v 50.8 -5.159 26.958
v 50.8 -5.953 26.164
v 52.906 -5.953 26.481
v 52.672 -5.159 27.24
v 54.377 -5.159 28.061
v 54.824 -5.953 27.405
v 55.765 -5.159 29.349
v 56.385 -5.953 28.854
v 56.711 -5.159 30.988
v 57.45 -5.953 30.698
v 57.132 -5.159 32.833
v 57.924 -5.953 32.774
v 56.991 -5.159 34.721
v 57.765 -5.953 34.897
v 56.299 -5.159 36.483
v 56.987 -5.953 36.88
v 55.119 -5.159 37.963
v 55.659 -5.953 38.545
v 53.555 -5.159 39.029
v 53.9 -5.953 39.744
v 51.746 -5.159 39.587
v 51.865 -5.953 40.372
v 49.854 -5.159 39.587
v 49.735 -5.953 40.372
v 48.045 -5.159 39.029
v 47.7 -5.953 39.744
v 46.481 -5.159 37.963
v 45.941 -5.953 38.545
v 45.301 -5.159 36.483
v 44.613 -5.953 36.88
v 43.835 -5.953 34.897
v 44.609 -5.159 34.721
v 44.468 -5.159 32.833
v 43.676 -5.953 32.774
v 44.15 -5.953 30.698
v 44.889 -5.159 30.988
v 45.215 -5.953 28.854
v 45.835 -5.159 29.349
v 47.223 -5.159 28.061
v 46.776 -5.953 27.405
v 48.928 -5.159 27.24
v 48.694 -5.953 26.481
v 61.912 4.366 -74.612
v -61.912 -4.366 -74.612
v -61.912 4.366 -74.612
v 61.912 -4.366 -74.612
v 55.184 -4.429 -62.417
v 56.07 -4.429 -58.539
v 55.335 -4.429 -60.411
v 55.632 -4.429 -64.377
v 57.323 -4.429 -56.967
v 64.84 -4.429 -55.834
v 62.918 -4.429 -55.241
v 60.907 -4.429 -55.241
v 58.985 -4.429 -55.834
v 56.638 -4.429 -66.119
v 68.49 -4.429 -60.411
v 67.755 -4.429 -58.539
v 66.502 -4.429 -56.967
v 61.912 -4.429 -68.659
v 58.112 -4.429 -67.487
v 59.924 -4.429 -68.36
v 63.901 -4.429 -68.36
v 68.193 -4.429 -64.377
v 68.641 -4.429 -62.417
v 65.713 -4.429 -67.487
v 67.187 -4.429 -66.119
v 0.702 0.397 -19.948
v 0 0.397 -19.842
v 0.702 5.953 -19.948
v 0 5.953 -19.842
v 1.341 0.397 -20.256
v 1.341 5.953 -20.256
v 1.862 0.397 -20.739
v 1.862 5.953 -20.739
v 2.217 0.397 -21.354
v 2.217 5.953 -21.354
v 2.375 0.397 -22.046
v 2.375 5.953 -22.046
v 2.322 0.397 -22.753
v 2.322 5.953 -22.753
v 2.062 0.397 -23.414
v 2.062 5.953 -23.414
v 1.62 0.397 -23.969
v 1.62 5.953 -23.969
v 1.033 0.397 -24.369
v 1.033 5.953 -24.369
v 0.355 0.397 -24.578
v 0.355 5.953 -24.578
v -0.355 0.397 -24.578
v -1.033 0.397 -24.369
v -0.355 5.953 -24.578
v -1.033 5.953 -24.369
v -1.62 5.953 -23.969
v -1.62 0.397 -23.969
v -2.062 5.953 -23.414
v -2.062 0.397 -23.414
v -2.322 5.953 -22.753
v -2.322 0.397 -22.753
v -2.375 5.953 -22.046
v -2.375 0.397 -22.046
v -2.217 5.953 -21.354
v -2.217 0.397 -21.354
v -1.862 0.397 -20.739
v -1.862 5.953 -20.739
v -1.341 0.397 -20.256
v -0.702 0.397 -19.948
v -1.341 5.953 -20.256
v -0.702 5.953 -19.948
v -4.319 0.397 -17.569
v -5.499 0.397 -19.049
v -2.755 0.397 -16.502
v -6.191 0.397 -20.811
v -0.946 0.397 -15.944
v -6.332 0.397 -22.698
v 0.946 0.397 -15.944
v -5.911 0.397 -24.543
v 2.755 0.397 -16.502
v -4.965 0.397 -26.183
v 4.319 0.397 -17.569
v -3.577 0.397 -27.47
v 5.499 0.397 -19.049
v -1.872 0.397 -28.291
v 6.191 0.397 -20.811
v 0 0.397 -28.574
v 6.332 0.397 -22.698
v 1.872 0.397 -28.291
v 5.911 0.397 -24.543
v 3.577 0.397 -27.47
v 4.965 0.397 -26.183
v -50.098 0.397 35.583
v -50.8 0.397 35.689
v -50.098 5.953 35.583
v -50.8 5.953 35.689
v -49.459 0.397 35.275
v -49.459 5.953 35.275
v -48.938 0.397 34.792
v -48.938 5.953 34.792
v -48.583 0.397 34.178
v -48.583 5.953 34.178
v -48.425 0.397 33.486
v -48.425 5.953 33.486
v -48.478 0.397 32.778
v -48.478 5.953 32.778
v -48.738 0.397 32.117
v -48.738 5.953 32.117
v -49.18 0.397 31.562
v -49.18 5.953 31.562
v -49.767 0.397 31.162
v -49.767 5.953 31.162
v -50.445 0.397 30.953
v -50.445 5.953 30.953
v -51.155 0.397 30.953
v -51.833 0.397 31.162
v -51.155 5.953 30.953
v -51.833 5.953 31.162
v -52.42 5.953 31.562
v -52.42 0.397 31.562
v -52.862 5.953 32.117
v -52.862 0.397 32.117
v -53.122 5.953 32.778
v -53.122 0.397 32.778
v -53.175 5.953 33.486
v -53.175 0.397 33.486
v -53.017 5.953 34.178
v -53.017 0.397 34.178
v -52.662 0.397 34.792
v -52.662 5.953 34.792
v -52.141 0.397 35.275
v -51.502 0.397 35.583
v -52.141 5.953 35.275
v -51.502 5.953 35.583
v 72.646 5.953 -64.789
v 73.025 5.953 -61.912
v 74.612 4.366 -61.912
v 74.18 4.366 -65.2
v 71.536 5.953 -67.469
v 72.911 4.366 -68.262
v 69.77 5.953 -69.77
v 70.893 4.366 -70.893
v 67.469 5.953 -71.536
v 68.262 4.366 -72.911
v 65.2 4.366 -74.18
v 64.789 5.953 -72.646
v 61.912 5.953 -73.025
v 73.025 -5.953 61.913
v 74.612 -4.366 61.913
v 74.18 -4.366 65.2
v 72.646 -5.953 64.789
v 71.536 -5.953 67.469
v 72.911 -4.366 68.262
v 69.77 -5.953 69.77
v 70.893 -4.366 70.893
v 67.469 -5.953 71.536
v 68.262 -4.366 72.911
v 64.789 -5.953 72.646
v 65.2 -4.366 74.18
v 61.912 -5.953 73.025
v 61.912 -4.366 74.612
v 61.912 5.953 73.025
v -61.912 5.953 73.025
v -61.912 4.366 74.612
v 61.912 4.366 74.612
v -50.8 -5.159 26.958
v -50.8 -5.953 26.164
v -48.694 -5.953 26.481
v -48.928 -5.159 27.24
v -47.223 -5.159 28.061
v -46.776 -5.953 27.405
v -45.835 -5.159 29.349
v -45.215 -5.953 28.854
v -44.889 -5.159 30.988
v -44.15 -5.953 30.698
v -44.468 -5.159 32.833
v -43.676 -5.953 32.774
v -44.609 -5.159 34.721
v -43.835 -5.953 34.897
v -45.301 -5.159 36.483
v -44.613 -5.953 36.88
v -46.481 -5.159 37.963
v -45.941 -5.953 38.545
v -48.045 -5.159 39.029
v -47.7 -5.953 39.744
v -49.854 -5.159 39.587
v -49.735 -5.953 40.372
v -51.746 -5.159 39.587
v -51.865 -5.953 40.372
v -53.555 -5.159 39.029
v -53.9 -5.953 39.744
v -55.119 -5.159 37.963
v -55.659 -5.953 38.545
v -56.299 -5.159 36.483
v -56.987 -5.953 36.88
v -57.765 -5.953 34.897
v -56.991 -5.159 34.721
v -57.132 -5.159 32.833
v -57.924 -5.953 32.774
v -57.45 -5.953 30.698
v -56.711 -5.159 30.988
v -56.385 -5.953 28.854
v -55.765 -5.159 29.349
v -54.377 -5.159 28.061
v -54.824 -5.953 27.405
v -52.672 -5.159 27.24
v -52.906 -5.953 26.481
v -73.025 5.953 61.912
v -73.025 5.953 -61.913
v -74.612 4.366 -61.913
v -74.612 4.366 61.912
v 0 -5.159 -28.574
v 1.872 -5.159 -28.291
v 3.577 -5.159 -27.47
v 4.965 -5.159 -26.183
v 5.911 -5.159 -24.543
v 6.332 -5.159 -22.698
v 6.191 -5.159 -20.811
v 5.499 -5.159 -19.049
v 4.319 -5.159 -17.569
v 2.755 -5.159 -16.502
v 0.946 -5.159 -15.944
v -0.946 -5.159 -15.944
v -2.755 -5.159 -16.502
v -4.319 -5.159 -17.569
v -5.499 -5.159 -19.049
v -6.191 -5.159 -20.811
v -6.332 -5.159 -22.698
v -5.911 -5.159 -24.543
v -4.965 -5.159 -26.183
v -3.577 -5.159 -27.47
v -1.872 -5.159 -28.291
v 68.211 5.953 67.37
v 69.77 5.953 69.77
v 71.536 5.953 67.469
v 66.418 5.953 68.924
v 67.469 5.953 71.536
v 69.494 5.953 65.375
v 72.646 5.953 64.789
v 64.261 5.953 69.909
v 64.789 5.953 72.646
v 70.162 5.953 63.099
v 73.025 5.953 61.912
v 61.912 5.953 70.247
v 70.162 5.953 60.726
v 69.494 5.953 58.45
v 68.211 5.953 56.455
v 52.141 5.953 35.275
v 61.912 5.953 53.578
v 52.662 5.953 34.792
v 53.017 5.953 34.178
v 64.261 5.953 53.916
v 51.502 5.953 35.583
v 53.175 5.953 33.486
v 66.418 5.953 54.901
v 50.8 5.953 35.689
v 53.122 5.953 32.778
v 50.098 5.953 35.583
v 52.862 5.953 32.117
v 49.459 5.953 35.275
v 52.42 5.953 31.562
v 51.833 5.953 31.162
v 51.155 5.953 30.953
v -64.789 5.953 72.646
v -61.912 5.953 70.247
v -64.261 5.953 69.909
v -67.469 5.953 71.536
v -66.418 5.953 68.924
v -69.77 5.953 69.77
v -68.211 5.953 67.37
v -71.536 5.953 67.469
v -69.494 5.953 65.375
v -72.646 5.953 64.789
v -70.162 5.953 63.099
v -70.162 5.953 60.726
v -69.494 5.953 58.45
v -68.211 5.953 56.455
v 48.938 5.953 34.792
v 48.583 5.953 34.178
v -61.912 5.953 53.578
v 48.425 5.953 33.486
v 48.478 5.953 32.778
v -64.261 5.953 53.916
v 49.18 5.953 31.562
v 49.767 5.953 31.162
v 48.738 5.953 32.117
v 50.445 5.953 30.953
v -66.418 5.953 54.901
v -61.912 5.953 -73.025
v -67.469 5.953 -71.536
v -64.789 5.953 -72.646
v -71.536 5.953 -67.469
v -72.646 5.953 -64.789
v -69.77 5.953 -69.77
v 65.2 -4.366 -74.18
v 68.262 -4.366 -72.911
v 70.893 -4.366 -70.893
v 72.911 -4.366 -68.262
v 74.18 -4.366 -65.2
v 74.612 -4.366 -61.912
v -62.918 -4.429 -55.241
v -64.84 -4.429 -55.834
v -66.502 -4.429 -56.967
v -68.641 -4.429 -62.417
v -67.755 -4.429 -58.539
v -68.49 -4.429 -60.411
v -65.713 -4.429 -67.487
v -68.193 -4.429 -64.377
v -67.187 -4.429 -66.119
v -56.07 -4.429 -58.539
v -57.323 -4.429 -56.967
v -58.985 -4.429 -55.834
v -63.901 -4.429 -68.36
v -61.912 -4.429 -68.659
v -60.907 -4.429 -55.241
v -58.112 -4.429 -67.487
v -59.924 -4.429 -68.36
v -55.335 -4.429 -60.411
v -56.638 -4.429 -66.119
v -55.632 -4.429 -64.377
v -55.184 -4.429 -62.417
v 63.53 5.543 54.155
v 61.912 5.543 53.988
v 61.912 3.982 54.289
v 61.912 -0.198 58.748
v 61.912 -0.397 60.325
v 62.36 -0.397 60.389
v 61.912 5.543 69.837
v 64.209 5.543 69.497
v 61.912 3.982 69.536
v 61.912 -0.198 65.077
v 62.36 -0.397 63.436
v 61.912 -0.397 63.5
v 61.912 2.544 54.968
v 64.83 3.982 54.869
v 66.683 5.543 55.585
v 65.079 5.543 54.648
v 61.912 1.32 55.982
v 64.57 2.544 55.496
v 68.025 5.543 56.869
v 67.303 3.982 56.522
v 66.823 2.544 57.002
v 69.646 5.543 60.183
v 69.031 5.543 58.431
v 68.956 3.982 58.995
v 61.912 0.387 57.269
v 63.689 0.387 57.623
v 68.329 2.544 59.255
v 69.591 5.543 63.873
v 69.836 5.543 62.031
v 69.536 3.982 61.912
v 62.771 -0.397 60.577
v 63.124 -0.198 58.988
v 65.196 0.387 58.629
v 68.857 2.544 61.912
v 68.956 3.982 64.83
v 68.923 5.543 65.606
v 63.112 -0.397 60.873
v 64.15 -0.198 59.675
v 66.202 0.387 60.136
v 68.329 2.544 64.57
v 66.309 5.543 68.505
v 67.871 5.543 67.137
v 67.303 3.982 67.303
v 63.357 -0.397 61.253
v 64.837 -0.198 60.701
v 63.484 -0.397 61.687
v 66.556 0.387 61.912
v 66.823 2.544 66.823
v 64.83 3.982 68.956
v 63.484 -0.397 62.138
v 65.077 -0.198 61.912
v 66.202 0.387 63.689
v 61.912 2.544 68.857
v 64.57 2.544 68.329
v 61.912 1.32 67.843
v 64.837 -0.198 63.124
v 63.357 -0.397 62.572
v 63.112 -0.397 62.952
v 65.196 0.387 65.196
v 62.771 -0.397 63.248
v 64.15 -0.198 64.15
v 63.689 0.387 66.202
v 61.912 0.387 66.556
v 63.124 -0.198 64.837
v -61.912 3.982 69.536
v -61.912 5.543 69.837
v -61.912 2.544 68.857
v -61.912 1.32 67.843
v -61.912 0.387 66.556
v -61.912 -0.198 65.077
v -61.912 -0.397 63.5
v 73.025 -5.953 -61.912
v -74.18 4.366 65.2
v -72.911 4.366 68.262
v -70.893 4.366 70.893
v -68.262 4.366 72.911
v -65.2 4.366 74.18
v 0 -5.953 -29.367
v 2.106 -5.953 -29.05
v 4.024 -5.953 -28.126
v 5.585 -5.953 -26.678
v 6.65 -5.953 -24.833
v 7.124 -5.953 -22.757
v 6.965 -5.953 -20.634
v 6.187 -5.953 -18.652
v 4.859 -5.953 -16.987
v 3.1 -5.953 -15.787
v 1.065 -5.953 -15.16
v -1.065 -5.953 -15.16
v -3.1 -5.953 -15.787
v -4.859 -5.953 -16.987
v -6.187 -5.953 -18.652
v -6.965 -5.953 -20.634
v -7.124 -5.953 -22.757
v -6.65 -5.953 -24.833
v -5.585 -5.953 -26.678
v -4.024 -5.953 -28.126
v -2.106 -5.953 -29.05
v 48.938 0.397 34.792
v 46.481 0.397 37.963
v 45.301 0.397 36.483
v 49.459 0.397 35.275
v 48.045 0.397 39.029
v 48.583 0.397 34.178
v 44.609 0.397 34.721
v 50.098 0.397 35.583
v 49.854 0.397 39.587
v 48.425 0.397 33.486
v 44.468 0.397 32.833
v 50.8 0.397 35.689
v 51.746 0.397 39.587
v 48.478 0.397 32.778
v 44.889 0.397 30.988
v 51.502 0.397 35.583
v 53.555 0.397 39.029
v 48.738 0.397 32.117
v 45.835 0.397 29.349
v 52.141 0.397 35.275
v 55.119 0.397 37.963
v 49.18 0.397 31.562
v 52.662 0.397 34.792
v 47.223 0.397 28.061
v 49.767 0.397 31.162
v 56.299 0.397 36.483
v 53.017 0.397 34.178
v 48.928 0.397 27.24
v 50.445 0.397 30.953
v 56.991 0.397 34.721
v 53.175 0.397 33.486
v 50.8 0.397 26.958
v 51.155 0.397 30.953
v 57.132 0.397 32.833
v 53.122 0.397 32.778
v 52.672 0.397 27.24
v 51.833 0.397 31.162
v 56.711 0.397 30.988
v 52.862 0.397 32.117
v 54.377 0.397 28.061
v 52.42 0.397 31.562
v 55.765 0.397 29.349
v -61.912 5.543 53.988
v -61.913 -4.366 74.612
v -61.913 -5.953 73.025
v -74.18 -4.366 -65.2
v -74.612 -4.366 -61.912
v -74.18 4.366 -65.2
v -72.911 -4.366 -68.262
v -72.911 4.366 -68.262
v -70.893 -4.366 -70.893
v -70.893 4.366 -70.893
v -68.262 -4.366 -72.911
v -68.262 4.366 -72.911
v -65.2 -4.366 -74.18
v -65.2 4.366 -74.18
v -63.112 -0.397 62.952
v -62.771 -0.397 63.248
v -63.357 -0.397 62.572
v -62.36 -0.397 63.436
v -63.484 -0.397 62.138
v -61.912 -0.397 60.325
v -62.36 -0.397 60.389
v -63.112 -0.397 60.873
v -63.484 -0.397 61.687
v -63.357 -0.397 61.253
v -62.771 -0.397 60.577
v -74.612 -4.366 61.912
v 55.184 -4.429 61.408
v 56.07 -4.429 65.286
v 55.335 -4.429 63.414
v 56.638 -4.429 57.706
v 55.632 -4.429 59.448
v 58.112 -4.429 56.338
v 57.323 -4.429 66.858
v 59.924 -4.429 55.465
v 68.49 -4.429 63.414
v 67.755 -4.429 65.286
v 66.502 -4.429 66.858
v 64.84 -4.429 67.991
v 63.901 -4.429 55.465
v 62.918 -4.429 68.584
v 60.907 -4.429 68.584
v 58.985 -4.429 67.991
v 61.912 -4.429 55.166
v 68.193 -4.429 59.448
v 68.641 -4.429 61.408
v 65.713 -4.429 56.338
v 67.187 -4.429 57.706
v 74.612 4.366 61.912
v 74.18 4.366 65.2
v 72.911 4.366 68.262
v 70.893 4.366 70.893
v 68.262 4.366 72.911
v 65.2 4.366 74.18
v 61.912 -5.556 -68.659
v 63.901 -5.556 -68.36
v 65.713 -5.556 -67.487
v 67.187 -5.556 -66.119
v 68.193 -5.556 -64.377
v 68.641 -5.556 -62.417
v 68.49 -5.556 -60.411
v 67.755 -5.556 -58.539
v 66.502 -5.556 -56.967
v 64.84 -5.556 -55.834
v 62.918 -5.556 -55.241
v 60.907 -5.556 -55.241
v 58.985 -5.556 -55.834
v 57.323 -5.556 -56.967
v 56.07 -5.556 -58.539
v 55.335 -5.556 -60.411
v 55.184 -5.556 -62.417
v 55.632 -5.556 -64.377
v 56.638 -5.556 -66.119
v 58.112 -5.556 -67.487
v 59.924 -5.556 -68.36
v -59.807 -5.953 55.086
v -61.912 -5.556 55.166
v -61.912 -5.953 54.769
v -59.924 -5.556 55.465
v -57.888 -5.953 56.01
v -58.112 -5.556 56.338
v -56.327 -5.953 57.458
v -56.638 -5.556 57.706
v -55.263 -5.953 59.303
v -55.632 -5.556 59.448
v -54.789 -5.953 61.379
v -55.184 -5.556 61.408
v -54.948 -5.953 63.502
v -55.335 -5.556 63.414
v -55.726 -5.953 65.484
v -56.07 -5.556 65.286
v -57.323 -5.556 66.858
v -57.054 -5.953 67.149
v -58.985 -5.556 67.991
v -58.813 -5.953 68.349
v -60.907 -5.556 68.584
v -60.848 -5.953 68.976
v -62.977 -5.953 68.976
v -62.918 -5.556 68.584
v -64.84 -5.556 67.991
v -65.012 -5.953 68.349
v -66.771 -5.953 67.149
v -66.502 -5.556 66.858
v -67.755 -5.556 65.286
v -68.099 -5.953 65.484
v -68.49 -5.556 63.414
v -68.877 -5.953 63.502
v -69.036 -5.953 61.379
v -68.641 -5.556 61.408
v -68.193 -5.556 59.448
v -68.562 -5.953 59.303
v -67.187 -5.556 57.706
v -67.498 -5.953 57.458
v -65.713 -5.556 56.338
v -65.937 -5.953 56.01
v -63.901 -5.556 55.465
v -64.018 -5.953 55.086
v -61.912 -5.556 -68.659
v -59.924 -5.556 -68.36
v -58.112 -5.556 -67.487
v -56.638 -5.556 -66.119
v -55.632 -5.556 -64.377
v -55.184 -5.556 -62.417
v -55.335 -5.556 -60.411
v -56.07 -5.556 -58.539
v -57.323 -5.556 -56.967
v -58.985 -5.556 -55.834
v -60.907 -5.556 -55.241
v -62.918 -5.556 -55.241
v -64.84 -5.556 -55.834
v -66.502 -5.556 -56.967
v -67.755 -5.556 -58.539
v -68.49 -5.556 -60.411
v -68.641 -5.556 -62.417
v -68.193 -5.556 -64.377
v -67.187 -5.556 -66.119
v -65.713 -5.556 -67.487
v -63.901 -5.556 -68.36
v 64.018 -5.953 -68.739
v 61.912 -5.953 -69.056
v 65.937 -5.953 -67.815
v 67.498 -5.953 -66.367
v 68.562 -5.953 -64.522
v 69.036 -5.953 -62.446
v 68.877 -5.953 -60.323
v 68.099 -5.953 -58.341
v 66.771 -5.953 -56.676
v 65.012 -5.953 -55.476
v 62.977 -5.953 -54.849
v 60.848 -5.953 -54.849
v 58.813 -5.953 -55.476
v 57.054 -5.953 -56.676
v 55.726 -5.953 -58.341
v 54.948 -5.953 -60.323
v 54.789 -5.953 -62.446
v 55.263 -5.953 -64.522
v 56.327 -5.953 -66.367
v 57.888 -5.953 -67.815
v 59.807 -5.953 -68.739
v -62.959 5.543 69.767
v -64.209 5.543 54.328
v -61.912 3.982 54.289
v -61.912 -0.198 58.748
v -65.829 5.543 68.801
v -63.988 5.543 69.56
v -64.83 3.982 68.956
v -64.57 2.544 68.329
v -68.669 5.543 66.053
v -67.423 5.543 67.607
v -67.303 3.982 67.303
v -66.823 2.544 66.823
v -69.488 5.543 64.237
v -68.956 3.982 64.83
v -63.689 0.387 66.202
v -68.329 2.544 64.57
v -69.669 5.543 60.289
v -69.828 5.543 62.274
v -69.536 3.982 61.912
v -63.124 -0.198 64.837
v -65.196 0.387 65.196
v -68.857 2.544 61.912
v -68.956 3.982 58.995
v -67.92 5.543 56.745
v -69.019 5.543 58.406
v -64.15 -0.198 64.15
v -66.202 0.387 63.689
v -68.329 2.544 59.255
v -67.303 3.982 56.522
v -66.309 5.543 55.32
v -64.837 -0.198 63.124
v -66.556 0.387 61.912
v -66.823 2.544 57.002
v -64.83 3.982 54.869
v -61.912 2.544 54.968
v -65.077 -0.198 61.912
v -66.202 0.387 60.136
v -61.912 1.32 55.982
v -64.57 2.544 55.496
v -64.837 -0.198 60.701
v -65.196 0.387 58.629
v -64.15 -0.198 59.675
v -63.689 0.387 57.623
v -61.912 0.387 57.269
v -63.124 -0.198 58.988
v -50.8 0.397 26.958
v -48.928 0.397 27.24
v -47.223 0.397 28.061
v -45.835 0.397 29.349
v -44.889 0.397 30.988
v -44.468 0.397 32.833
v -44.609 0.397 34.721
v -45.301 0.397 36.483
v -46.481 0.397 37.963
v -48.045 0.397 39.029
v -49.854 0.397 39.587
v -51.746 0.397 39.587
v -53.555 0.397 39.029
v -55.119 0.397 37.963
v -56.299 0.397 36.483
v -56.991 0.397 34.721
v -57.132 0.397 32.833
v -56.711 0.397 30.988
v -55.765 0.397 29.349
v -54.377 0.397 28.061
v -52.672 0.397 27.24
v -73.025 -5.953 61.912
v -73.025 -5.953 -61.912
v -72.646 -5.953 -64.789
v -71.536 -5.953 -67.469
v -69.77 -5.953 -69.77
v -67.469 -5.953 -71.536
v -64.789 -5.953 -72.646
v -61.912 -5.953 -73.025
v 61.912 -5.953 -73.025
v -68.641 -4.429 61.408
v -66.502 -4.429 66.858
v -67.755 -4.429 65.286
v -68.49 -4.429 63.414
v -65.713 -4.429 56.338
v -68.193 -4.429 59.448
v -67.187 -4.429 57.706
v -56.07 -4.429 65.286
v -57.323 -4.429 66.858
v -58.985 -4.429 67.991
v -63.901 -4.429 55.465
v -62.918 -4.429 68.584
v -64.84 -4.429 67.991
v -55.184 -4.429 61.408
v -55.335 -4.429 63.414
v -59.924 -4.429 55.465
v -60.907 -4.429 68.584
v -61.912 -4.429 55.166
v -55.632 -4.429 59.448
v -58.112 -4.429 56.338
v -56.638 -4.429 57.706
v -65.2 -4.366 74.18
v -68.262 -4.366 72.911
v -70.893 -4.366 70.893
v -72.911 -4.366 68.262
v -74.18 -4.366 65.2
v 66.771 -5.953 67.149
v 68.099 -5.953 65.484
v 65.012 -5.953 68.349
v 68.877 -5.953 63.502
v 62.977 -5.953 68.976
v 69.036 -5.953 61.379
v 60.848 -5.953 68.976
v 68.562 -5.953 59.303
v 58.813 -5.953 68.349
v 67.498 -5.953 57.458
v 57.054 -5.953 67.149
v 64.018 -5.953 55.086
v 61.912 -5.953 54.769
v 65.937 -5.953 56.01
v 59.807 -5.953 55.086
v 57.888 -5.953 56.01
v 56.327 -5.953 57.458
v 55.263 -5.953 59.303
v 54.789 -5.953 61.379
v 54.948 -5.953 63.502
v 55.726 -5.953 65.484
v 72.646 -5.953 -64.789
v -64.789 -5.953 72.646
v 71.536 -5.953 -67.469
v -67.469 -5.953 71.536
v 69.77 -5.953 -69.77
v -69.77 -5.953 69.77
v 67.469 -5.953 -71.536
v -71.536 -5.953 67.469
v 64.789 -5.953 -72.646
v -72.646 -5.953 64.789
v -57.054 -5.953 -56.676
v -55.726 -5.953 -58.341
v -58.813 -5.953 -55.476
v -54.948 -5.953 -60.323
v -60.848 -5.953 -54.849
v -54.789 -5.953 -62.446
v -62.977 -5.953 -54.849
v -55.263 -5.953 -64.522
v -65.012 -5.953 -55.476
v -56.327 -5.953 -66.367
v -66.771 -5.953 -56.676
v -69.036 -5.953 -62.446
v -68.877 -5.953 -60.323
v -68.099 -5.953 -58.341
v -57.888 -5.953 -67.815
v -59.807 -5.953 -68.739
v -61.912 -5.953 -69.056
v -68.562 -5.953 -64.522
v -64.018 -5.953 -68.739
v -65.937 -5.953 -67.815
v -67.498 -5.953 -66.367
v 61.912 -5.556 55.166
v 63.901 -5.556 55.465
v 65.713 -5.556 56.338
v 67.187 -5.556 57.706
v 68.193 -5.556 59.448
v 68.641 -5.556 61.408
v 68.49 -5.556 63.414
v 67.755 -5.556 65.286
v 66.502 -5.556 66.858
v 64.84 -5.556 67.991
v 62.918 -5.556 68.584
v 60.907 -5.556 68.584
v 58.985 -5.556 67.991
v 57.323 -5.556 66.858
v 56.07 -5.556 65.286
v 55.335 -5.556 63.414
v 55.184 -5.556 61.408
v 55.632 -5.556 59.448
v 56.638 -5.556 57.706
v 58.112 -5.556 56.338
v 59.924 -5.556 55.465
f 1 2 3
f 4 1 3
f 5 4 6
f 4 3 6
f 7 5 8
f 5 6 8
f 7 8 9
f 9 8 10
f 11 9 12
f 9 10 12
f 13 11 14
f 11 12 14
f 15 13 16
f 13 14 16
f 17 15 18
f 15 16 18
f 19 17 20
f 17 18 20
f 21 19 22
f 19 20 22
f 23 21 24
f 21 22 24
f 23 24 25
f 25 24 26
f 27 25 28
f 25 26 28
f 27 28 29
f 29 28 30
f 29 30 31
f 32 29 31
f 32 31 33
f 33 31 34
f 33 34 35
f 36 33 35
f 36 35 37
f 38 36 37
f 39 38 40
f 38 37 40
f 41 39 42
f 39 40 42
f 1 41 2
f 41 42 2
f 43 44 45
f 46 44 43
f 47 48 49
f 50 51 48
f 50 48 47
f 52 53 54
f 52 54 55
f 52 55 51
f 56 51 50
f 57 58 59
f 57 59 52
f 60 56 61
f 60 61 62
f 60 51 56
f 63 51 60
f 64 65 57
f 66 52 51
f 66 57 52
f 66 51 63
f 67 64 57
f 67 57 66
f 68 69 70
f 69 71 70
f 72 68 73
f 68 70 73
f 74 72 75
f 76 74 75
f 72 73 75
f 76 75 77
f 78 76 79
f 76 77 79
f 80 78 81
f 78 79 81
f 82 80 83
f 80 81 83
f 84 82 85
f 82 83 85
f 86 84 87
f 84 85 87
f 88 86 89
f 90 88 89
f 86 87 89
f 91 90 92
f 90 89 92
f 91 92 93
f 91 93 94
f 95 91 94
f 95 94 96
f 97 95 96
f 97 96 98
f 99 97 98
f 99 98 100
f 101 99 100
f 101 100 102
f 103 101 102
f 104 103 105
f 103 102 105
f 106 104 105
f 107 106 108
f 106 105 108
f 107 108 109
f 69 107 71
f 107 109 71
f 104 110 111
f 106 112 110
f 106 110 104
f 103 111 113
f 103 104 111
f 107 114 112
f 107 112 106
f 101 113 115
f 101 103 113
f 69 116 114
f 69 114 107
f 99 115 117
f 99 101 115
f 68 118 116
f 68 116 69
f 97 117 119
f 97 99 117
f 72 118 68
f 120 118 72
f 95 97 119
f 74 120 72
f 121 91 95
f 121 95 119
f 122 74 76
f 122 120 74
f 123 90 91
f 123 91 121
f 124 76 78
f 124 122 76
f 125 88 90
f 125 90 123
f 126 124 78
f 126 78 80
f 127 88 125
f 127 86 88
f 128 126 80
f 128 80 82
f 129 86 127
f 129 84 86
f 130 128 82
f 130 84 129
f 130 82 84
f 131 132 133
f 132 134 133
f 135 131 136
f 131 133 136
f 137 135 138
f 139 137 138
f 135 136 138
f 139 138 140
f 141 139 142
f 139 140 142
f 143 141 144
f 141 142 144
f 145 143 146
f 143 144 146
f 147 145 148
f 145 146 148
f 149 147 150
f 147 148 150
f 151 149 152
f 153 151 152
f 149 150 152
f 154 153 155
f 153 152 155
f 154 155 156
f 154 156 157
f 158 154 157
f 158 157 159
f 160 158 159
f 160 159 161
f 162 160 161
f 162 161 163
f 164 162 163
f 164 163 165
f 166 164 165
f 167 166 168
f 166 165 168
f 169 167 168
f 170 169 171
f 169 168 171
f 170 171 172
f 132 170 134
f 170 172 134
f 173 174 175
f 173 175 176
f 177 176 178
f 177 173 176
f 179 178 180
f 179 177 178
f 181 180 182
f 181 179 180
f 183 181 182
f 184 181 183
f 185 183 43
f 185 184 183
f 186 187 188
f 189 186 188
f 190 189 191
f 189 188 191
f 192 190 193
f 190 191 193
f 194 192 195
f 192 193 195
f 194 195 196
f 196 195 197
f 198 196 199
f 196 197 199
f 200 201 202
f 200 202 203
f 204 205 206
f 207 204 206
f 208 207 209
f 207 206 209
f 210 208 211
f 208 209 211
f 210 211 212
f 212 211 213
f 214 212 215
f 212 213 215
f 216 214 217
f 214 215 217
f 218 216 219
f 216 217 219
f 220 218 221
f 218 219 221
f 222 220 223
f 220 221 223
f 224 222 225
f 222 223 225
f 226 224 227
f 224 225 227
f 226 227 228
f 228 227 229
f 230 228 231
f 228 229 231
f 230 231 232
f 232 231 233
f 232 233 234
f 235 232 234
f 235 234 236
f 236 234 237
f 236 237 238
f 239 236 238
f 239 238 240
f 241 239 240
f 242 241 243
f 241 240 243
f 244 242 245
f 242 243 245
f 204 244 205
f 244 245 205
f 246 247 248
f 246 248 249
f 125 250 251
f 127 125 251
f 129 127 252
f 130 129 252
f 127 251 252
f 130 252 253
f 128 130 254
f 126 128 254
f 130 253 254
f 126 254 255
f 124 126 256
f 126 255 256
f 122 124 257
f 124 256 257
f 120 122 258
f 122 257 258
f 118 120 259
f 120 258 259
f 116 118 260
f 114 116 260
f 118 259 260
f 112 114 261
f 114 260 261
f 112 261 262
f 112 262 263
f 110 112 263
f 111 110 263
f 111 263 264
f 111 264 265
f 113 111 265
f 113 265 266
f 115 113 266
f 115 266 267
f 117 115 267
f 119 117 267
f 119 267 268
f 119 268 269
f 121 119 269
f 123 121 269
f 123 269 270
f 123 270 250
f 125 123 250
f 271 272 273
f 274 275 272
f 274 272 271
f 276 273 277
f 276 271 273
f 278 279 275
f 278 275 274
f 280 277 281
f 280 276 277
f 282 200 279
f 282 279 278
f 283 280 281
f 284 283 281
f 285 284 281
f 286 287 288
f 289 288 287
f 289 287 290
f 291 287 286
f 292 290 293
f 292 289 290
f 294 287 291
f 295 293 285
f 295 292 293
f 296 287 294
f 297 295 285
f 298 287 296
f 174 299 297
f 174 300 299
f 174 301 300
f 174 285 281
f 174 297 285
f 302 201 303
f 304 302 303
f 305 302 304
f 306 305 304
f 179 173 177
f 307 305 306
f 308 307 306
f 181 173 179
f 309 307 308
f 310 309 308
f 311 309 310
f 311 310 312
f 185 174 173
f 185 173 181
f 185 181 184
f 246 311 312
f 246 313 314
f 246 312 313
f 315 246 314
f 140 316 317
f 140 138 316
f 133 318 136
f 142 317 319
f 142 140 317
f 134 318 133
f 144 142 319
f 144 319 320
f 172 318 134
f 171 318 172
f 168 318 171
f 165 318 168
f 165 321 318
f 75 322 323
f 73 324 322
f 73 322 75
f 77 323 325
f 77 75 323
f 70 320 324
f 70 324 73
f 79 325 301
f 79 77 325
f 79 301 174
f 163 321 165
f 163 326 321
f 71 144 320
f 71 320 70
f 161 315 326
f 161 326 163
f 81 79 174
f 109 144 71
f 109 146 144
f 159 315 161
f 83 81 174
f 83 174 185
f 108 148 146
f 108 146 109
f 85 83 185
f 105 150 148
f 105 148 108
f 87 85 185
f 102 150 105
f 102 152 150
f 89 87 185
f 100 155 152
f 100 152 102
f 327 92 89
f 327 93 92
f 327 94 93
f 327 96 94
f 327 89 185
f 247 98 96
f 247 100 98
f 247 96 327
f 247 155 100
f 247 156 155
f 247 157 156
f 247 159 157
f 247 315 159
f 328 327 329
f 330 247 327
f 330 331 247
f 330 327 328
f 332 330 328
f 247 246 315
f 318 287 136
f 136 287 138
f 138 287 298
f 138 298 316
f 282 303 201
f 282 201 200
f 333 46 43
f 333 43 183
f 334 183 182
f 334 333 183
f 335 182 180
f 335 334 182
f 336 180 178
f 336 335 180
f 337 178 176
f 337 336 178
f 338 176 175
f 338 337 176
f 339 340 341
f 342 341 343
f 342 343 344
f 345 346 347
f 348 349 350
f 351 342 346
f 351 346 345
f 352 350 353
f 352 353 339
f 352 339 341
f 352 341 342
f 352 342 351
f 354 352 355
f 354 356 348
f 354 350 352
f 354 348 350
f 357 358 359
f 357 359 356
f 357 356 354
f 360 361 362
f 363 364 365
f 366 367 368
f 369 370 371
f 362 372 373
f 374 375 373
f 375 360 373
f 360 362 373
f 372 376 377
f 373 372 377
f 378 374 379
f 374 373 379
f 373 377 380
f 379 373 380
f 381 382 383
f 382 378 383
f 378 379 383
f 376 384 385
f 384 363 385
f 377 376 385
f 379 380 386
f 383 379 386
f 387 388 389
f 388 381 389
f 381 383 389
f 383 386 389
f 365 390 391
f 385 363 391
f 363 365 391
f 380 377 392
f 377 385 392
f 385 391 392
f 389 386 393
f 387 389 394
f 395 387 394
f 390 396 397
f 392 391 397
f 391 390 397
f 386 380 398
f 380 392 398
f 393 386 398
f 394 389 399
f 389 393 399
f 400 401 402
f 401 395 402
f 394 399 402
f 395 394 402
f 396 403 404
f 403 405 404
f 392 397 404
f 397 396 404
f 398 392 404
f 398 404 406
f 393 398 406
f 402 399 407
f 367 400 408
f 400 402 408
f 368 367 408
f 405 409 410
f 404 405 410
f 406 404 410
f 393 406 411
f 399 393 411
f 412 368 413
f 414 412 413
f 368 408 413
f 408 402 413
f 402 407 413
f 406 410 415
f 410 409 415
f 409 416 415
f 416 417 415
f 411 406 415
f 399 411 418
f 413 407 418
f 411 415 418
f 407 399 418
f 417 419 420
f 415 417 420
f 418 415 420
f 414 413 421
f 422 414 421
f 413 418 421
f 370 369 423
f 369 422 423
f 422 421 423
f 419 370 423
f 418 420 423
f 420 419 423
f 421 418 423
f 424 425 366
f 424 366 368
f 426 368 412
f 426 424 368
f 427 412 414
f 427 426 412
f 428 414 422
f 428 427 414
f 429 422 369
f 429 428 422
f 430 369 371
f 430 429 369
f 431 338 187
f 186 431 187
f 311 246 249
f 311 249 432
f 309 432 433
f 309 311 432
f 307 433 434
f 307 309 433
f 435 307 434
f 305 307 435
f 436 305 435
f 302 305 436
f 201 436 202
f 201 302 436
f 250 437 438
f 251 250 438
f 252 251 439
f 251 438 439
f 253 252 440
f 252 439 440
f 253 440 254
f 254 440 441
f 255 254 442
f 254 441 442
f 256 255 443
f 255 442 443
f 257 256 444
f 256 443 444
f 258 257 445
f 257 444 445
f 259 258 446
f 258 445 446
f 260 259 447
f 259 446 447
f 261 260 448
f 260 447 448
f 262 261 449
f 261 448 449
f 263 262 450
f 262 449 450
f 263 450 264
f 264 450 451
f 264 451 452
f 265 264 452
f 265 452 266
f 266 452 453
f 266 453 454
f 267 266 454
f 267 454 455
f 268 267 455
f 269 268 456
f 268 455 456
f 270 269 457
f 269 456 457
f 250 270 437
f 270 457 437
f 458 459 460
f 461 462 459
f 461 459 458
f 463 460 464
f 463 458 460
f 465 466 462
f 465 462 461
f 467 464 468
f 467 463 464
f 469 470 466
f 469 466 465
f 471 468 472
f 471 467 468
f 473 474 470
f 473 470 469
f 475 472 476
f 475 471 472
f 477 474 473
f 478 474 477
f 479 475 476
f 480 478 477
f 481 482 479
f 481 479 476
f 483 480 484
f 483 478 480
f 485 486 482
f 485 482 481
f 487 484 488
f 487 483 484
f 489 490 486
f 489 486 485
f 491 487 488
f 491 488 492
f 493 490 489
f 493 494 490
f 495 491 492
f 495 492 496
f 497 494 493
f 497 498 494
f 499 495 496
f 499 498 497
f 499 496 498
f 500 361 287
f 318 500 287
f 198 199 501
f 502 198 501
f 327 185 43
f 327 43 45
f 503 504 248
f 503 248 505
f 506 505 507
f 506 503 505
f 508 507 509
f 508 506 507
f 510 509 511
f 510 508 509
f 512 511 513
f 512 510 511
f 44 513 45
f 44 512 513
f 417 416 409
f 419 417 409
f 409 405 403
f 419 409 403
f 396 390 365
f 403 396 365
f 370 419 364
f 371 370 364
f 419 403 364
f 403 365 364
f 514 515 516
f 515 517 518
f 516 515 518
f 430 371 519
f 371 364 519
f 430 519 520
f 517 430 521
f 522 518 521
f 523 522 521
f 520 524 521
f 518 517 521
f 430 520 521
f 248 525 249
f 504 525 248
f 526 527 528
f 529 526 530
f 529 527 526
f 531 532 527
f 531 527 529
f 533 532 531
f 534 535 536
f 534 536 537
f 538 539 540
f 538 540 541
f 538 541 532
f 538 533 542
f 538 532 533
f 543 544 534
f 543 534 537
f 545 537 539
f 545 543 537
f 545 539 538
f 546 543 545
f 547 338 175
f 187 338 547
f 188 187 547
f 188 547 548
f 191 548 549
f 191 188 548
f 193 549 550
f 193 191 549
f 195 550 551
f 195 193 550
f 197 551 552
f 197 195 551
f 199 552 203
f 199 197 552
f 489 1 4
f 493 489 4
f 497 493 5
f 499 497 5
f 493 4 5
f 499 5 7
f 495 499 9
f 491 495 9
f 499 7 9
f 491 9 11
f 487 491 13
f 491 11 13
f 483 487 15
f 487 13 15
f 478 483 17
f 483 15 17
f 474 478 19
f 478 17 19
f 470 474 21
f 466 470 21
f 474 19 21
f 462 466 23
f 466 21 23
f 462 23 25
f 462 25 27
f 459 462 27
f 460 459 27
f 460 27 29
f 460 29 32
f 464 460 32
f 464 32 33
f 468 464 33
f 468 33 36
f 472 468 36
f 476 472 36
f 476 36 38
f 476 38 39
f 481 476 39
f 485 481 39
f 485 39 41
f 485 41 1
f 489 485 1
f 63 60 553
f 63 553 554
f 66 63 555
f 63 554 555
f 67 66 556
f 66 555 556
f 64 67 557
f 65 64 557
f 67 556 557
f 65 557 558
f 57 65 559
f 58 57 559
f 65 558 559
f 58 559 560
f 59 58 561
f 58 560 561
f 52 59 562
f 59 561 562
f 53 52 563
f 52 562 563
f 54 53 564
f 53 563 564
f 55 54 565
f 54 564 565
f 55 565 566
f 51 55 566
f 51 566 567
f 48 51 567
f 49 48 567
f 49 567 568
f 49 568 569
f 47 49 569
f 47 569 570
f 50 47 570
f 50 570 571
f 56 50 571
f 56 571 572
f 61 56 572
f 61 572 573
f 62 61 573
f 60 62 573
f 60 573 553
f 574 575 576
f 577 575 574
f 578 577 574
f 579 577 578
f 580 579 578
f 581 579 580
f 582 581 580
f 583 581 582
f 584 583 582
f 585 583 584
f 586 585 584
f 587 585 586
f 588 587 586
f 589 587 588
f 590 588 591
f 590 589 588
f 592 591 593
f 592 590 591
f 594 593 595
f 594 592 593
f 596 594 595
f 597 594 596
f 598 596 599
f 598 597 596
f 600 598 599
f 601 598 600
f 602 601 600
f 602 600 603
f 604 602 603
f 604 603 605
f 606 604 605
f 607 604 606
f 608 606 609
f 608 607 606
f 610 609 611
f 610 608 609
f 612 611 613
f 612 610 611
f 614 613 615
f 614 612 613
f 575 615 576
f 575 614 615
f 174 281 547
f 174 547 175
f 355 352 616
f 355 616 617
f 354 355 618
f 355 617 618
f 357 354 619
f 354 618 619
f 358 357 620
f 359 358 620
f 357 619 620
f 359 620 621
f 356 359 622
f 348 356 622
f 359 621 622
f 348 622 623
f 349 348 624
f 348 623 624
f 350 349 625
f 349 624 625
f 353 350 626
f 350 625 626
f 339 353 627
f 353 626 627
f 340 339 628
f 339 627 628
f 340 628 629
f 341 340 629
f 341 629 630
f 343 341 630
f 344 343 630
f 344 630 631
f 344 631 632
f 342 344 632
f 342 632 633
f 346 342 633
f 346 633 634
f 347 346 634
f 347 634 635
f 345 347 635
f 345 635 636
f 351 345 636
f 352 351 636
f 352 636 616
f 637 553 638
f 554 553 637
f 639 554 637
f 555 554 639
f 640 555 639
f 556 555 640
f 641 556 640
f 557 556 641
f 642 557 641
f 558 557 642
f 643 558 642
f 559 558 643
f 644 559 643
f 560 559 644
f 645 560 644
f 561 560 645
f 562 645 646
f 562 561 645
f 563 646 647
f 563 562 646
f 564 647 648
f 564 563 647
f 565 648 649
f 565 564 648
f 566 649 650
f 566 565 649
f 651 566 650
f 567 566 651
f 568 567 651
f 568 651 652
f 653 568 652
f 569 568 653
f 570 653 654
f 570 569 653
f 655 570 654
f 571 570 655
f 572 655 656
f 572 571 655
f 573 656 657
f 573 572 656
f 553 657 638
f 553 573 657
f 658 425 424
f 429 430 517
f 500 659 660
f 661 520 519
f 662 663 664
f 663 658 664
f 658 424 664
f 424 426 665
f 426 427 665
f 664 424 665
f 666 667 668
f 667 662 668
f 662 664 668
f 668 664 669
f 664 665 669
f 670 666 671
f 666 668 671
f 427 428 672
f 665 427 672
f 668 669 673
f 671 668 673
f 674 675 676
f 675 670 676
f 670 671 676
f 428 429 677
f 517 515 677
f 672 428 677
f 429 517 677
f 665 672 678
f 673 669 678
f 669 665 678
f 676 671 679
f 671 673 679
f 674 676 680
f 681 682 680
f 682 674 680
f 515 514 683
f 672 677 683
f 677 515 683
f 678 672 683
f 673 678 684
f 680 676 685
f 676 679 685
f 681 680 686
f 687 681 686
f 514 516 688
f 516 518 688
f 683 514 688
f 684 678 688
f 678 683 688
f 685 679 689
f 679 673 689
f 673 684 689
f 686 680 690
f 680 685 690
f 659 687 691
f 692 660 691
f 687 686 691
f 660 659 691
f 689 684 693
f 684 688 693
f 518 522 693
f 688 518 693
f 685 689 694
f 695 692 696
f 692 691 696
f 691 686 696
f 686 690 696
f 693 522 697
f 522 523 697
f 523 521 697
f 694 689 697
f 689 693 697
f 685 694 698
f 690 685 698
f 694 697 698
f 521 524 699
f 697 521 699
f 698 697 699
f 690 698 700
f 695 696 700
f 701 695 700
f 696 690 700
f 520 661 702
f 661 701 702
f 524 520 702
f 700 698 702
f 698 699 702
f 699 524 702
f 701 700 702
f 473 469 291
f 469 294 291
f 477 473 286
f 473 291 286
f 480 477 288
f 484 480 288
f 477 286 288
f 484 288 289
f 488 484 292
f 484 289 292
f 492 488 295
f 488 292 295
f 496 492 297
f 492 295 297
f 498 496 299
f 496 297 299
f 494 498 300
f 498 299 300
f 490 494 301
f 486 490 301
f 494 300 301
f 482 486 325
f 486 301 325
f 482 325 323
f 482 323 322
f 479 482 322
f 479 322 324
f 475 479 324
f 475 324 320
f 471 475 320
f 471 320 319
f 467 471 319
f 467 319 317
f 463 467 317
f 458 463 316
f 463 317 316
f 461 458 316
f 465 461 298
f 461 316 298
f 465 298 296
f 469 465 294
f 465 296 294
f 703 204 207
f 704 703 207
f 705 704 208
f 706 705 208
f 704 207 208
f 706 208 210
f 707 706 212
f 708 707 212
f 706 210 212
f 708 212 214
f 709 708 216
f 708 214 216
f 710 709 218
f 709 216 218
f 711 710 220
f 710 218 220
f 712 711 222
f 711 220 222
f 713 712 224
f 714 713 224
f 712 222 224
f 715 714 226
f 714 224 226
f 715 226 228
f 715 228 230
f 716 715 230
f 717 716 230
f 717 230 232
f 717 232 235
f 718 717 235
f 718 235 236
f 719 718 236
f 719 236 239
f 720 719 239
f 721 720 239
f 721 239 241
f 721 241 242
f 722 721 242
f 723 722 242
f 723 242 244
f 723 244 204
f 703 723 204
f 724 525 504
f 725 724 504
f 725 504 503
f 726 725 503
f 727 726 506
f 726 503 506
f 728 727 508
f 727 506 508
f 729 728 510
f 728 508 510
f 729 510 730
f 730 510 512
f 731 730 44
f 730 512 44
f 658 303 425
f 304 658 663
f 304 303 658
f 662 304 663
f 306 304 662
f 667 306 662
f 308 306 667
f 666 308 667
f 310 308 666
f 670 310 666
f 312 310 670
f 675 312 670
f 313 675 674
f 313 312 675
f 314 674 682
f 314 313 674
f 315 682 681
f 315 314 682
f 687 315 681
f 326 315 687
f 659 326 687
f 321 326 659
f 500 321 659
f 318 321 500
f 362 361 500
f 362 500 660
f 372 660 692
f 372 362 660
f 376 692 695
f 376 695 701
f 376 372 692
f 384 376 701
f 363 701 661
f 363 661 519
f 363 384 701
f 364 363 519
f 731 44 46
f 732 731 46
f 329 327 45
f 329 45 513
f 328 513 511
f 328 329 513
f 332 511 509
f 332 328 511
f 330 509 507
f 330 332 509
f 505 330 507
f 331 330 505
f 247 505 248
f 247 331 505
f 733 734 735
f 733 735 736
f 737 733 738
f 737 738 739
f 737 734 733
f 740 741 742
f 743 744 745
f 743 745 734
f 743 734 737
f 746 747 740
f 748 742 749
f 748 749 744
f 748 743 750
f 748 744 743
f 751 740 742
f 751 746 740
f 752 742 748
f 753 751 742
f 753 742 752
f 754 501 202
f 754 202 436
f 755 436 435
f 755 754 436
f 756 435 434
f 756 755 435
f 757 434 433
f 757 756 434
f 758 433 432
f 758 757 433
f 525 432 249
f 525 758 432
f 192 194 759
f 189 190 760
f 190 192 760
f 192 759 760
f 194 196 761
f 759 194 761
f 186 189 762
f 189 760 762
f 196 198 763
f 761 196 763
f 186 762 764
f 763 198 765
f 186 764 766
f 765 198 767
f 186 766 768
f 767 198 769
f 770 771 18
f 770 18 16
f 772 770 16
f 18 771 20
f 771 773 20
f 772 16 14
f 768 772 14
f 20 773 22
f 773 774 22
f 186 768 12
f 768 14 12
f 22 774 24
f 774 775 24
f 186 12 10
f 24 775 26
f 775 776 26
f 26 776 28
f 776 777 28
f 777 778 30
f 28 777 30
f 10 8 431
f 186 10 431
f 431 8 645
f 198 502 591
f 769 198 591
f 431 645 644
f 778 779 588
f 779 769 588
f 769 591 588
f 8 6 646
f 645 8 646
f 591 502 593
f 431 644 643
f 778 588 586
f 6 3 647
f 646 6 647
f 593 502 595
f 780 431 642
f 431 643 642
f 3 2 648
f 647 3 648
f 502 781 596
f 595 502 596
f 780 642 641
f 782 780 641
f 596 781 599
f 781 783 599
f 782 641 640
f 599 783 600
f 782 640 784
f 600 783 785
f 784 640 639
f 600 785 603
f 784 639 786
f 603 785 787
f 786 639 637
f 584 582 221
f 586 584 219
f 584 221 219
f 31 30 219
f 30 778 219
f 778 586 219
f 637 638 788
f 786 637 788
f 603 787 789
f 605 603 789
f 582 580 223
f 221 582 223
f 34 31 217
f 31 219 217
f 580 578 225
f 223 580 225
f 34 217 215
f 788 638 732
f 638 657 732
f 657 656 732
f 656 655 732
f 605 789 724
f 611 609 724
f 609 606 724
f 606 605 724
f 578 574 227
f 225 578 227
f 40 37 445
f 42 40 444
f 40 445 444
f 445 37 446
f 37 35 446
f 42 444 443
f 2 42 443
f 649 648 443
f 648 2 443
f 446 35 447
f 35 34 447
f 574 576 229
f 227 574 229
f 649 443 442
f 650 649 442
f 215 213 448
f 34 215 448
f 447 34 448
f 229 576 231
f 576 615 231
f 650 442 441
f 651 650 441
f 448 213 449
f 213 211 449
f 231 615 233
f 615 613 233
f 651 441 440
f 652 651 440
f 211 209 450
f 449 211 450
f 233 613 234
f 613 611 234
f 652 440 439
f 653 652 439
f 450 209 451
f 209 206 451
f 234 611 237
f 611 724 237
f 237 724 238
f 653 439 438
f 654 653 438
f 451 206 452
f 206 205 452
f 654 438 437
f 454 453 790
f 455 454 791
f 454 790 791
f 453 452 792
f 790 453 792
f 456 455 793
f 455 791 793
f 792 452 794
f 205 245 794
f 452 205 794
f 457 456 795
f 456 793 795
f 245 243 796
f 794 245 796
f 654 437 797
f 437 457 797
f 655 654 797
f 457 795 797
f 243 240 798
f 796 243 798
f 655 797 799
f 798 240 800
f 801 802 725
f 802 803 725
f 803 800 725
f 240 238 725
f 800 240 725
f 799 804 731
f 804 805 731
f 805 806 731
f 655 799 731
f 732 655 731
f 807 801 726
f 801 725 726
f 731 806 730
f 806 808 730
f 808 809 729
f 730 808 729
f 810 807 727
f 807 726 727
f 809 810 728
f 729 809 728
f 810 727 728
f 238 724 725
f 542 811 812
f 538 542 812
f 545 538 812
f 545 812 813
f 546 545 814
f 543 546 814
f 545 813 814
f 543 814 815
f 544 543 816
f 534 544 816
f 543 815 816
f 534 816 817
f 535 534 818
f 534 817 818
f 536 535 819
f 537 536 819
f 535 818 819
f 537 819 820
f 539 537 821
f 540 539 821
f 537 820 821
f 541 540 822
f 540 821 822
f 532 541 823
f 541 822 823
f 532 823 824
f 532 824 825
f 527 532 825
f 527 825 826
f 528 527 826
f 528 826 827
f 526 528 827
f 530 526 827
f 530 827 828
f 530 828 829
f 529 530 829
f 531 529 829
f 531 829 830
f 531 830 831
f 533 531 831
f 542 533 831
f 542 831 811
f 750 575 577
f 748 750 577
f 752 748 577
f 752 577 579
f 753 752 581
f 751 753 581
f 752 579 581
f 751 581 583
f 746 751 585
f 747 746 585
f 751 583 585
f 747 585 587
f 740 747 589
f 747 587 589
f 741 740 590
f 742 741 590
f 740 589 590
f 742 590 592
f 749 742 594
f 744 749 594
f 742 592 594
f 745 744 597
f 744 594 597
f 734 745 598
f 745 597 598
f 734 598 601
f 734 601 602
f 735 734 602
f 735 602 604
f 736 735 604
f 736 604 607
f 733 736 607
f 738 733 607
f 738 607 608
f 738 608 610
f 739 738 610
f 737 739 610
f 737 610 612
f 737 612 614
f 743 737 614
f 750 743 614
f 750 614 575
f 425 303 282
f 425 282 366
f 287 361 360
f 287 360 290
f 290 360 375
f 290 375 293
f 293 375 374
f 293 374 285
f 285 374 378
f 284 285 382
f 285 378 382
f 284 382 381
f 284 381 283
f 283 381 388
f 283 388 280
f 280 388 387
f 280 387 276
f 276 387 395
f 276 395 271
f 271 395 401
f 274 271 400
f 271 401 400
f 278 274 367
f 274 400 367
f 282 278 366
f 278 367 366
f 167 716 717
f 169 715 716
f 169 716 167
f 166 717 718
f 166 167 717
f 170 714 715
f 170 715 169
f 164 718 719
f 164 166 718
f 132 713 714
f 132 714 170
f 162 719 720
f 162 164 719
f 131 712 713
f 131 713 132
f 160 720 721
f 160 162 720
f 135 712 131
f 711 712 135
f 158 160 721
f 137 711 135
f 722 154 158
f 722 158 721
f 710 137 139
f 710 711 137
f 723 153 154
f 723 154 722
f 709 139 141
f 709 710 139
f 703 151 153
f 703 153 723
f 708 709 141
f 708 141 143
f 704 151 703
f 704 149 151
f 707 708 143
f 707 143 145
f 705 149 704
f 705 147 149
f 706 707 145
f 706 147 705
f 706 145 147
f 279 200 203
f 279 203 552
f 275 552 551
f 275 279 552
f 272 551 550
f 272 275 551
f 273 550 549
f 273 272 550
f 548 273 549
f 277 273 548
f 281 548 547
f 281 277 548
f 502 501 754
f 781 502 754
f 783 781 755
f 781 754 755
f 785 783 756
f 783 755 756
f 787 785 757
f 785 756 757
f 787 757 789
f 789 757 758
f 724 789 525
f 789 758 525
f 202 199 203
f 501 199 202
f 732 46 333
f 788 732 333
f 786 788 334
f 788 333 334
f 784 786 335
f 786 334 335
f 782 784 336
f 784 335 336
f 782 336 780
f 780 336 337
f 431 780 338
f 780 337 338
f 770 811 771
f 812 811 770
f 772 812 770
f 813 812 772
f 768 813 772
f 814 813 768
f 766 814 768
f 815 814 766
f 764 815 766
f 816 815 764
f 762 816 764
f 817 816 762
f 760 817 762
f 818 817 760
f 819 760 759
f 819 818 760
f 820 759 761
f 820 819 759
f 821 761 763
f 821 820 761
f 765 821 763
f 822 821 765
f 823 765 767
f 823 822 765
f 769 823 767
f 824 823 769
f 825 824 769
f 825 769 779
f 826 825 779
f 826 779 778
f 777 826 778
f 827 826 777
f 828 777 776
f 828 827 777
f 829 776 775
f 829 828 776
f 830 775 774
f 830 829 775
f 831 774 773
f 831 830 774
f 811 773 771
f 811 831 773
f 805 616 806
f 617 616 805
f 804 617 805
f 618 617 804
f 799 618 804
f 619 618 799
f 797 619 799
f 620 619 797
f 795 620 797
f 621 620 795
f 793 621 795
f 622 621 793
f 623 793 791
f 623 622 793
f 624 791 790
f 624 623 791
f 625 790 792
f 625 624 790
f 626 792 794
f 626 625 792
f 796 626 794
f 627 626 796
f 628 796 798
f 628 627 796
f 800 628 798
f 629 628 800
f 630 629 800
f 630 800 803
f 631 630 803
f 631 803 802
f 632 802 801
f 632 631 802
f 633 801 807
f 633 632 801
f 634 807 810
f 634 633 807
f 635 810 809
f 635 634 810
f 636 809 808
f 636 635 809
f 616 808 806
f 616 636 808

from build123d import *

# Parameters (mm, degrees)
BOSS_EXTRUDE1_DEPTH      = 76.2
BOSS_EXTRUDE1_DEPTH_BACK = 76.2
SKETCH3_W                = 152.4
SKETCH3_H                = 11.90625
SKETCH8_OUTSIDE_W        = 197.57
SKETCH8_OUTSIDE_H        = 197.57
CUT_EXTRUDE2_DEPTH       = 109.41881197
CHAMFER1_SIZE            = 1.5875
PEN_SLOT_CUT_DEPTH       = 6.35
PEN_SLOT_FILLET_R        = 6.35
HOLE1_D                  = 4.7625
HOLE1_CBORE_D            = 12.7
HOLE1_CBORE_DEPTH        = 6.35
SKETCH6_R                = 6.746875
CUT_EXTRUDE1_DEPTH       = 1.524
BASE_CHAMFERS_SIZE       = 0.79375


# Some blends are built 0.0001 mm under size
with BuildPart() as part:
    # Sketch3 → Boss-Extrude1 (new, two sides: drawn at the far end of the back side and taken through both)
    with BuildSketch(Plane(origin=(0, 0, 0), x_dir=(0, 0, -1), z_dir=(1, 0, 0)).offset(-BOSS_EXTRUDE1_DEPTH_BACK)):
        Rectangle(SKETCH3_W, SKETCH3_H)
    extrude(amount=BOSS_EXTRUDE1_DEPTH + BOSS_EXTRUDE1_DEPTH_BACK)

    # Sketch8 outside → Cut-Extrude2 (cut, through all)
    with BuildSketch(Plane.XZ.offset(5.953125)):
        Rectangle(SKETCH8_OUTSIDE_W, SKETCH8_OUTSIDE_H)
        with BuildLine():
            Line((-61.9125, -74.6125), (61.9125, -74.6125))
            ThreePointArc((61.9125, -74.6125), (70.892756121, -70.892756121), (74.6125, -61.9125))
            Line((74.6125, -61.9125), (74.6125, 61.9125))
            ThreePointArc((74.6125, 61.9125), (70.892756121, 70.892756121), (61.9125, 74.6125))
            Line((61.9125, 74.6125), (-61.9125, 74.6125))
            ThreePointArc((-61.9125, 74.6125), (-70.892756121, 70.892756121), (-74.6125, 61.9125))
            Line((-74.6125, 61.9125), (-74.6125, -61.9125))
            ThreePointArc((-74.6125, -61.9125), (-70.892756121, -70.892756121), (-61.9125, -74.6125))
        make_face(mode=Mode.SUBTRACT)
    extrude(amount=-CUT_EXTRUDE2_DEPTH, mode=Mode.SUBTRACT)

    # Chamfer1
    chamfer1_edges = [part.edges().sort_by_distance(p)[0] for p in [
        (-74.6125, 5.953125, 0),
        (-70.892756121, 5.953125, -70.892756121),
        (0, 5.953125, -74.6125),
        (70.892756121, 5.953125, -70.892756121),
        (74.6125, 5.953125, 0),
        (70.892756121, 5.953125, 70.892756121),
        (0, 5.953125, 74.6125),
        (-70.892756121, 5.953125, 70.892756121),
        (-70.892756121, -5.953125, -70.892756121),
        (-74.6125, -5.953125, 0),
        (-70.892756121, -5.953125, 70.892756121),
        (0, -5.953125, 74.6125),
        (70.892756121, -5.953125, 70.892756121),
        (74.6125, -5.953125, 0),
        (70.892756121, -5.953125, -70.892756121),
        (0, -5.953125, -74.6125),
    ]]
    chamfer(chamfer1_edges, length=CHAMFER1_SIZE)

    # Pen Slot Sketch → Pen Slot Cut (cut)
    with BuildSketch(Plane(origin=(0, 5.953125, 0), x_dir=(1, 0, 0), z_dir=(0, 1, 0))):
        with BuildLine():
            Line((-61.9125, -53.975), (61.9125, -53.975))
            ThreePointArc((61.9125, -53.975), (69.85, -61.9125), (61.9125, -69.85))
            Line((61.9125, -69.85), (-61.9125, -69.85))
            ThreePointArc((-61.9125, -69.85), (-69.85, -61.9125), (-61.9125, -53.975))
        make_face()
    extrude(amount=-PEN_SLOT_CUT_DEPTH, mode=Mode.SUBTRACT)

    # Pen Slot Fillet
    pen_slot_fillet_edges = [part.edges().sort_by_distance(p)[0] for p in [
        (0, -0.396875, 53.975),
        (69.85, -0.396875, 61.9125),
        (0, -0.396875, 69.85),
        (-69.85, -0.396875, 61.9125),
    ]]
    fillet(pen_slot_fillet_edges, radius=PEN_SLOT_FILLET_R - 0.0001)  # a hair under: the kernel refuses the full size

    # Hole1 (through all)
    with Locations(Plane(origin=(-50.8, -5.953125, 33.30776944), x_dir=(0, 0, -1), z_dir=(0, -1, 0))):
        with Locations((0, 0), (0, 101.6), (55.531312028, 50.8)):
            CounterBoreHole(HOLE1_D / 2, HOLE1_CBORE_D / 2, HOLE1_CBORE_DEPTH)

    # Sketch6 → Cut-Extrude1 (cut)
    with BuildSketch(Plane(origin=(0, -5.953125, 0), x_dir=(-1, 0, 0), z_dir=(0, -1, 0))):
        with Locations(Location((-61.9125, 61.9125, 0), (0, 0, 90))):
            Circle(SKETCH6_R)
        with Locations(Location((61.9125, 61.9125, 0), (0, 0, 90))):
            Circle(SKETCH6_R)
        with Locations(Location((61.9125, -61.9125, 0), (0, 0, 90))):
            Circle(SKETCH6_R)
        with Locations(Location((-61.9125, -61.9125, 0), (0, 0, 90))):
            Circle(SKETCH6_R)
    extrude(amount=-CUT_EXTRUDE1_DEPTH, mode=Mode.SUBTRACT)

    # Chamfer2
    # the kernel refuses this chamfer: 0.396875 mm, written as the material it takes off along each edge
    with BuildSketch(Plane(origin=(-61.9125, 5.953125, 61.9125), x_dir=(0, 0, 1), z_dir=(1, 0, 0))) as chamfer2_piece_1:
        with BuildLine():
            Line((7.853310099, 0.481064901), (8.418564901, -0.084189901))
            Line((8.418564901, -0.084189901), (8.418564901, -0.143721151))
            ThreePointArc((8.418564901, -0.143721151), (8.178032451, -0.05953125), (7.9375, -0.05953125))
            Line((7.9375, -0.05953125), (7.87796875, 0))
            ThreePointArc((7.87796875, 0), (7.87796875, 0.240532451), (7.793778849, 0.481064901))
            Line((7.793778849, 0.481064901), (7.853310099, 0.481064901))
        make_face()
    revolve(axis=Axis((-61.9125, 5.953125, 61.9125), (0, -1, 0)), revolution_arc=180, mode=Mode.SUBTRACT)
    with BuildSketch(Plane(origin=(61.9125, 5.953125, 69.85), x_dir=(0, 0.17238737169530088, 0.9850292351397425), z_dir=(-1, 0, 0))) as chamfer2_piece_2:
        with BuildLine():
            Line((0.488376267, 0), (-0.165859028, -0.459349716))
            Line((-0.165859028, -0.459349716), (-0.224499049, -0.44908728))
            ThreePointArc((-0.224499049, -0.44908728), (-0.100104779, -0.22666906), (-0.058640022, 0.010262436))
            Line((-0.058640022, 0.010262436), (0.010262436, 0.058640022))
            ThreePointArc((0.010262436, 0.058640022), (0.247193932, 0.017175265), (0.498638703, 0.058640022))
            Line((0.498638703, 0.058640022), (0.488376267, 0))
        make_face()
    extrude(amount=123.825, mode=Mode.SUBTRACT)
    with BuildSketch(Plane(origin=(61.9125, 5.953125, 61.9125), x_dir=(0, 0, -1), z_dir=(-1, 0, 0))) as chamfer2_piece_3:
        with BuildLine():
            Line((8.418564901, -0.084189901), (7.853310099, 0.481064901))
            Line((7.853310099, 0.481064901), (7.793778849, 0.481064901))
            ThreePointArc((7.793778849, 0.481064901), (7.87796875, 0.240532451), (7.87796875, 0))
            Line((7.87796875, 0), (7.9375, -0.05953125))
            ThreePointArc((7.9375, -0.05953125), (8.178032451, -0.05953125), (8.418564901, -0.143721151))
            Line((8.418564901, -0.143721151), (8.418564901, -0.084189901))
        make_face()
    revolve(axis=Axis((61.9125, 5.953125, 61.9125), (0, -1, 0)), revolution_arc=180, mode=Mode.SUBTRACT)
    with BuildSketch(Plane(origin=(-61.9125, 5.953125, 53.975), x_dir=(0, -0.9850292351397427, 0.17238737169529986), z_dir=(1, 0, 0))) as chamfer2_piece_4:
        with BuildLine():
            Line((0.488376267, 0), (-0.165859028, 0.459349716))
            Line((-0.165859028, 0.459349716), (-0.224499049, 0.44908728))
            ThreePointArc((-0.224499049, 0.44908728), (-0.100104779, 0.22666906), (-0.058640022, -0.010262436))
            Line((-0.058640022, -0.010262436), (0.010262436, -0.058640022))
            ThreePointArc((0.010262436, -0.058640022), (0.247193932, -0.017175265), (0.498638703, -0.058640022))
            Line((0.498638703, -0.058640022), (0.488376267, 0))
        make_face()
    extrude(amount=123.825, mode=Mode.SUBTRACT)
    with BuildSketch(Plane(origin=(61.9125, -5.953125, 61.9125), x_dir=(0, 0, -1), z_dir=(-1, 0, 0))) as chamfer2_piece_5:
        with BuildLine():
            Line((7.227939901, 0.084189901), (6.662685099, -0.481064901))
            Line((6.662685099, -0.481064901), (6.603153849, -0.481064901))
            ThreePointArc((6.603153849, -0.481064901), (6.68734375, -0.240532451), (6.68734375, 0))
            Line((6.68734375, 0), (6.746875, 0.05953125))
            ThreePointArc((6.746875, 0.05953125), (6.987407451, 0.05953125), (7.227939901, 0.143721151))
            Line((7.227939901, 0.143721151), (7.227939901, 0.084189901))
        make_face()
    revolve(axis=Axis((61.9125, -5.953125, 61.9125), (0, -1, 0)), mode=Mode.SUBTRACT)
    with BuildSketch(Plane(origin=(-61.9125, -5.953125, 61.9125), x_dir=(0, 0, -1), z_dir=(-1, 0, 0))) as chamfer2_piece_6:
        with BuildLine():
            Line((7.227939901, 0.084189901), (6.662685099, -0.481064901))
            Line((6.662685099, -0.481064901), (6.603153849, -0.481064901))
            ThreePointArc((6.603153849, -0.481064901), (6.68734375, -0.240532451), (6.68734375, 0))
            Line((6.68734375, 0), (6.746875, 0.05953125))
            ThreePointArc((6.746875, 0.05953125), (6.987407451, 0.05953125), (7.227939901, 0.143721151))
            Line((7.227939901, 0.143721151), (7.227939901, 0.084189901))
        make_face()
    revolve(axis=Axis((-61.9125, -5.953125, 61.9125), (0, -1, 0)), mode=Mode.SUBTRACT)
    with BuildSketch(Plane(origin=(-61.9125, -5.953125, -61.9125), x_dir=(0, 0, -1), z_dir=(-1, 0, 0))) as chamfer2_piece_7:
        with BuildLine():
            Line((7.227939901, 0.084189901), (6.662685099, -0.481064901))
            Line((6.662685099, -0.481064901), (6.603153849, -0.481064901))
            ThreePointArc((6.603153849, -0.481064901), (6.68734375, -0.240532451), (6.68734375, 0))
            Line((6.68734375, 0), (6.746875, 0.05953125))
            ThreePointArc((6.746875, 0.05953125), (6.987407451, 0.05953125), (7.227939901, 0.143721151))
            Line((7.227939901, 0.143721151), (7.227939901, 0.084189901))
        make_face()
    revolve(axis=Axis((-61.9125, -5.953125, -61.9125), (0, -1, 0)), mode=Mode.SUBTRACT)
    with BuildSketch(Plane(origin=(61.9125, -5.953125, -61.9125), x_dir=(0, 0, -1), z_dir=(-1, 0, 0))) as chamfer2_piece_8:
        with BuildLine():
            Line((7.227939901, 0.084189901), (6.662685099, -0.481064901))
            Line((6.662685099, -0.481064901), (6.603153849, -0.481064901))
            ThreePointArc((6.603153849, -0.481064901), (6.68734375, -0.240532451), (6.68734375, 0))
            Line((6.68734375, 0), (6.746875, 0.05953125))
            ThreePointArc((6.746875, 0.05953125), (6.987407451, 0.05953125), (7.227939901, 0.143721151))
            Line((7.227939901, 0.143721151), (7.227939901, 0.084189901))
        make_face()
    revolve(axis=Axis((61.9125, -5.953125, -61.9125), (0, -1, 0)), mode=Mode.SUBTRACT)

    # Base Chamfers
    base_chamfers_edges = [part.edges().sort_by_distance(p)[0] for p in [
        (0, -5.953125, -15.873542588),
        (50.8, -5.953125, 39.65776944),
        (-50.8, -5.953125, 39.65776944),
    ]]
    chamfer(base_chamfers_edges, length=BASE_CHAMFERS_SIZE)


solid = part.part
